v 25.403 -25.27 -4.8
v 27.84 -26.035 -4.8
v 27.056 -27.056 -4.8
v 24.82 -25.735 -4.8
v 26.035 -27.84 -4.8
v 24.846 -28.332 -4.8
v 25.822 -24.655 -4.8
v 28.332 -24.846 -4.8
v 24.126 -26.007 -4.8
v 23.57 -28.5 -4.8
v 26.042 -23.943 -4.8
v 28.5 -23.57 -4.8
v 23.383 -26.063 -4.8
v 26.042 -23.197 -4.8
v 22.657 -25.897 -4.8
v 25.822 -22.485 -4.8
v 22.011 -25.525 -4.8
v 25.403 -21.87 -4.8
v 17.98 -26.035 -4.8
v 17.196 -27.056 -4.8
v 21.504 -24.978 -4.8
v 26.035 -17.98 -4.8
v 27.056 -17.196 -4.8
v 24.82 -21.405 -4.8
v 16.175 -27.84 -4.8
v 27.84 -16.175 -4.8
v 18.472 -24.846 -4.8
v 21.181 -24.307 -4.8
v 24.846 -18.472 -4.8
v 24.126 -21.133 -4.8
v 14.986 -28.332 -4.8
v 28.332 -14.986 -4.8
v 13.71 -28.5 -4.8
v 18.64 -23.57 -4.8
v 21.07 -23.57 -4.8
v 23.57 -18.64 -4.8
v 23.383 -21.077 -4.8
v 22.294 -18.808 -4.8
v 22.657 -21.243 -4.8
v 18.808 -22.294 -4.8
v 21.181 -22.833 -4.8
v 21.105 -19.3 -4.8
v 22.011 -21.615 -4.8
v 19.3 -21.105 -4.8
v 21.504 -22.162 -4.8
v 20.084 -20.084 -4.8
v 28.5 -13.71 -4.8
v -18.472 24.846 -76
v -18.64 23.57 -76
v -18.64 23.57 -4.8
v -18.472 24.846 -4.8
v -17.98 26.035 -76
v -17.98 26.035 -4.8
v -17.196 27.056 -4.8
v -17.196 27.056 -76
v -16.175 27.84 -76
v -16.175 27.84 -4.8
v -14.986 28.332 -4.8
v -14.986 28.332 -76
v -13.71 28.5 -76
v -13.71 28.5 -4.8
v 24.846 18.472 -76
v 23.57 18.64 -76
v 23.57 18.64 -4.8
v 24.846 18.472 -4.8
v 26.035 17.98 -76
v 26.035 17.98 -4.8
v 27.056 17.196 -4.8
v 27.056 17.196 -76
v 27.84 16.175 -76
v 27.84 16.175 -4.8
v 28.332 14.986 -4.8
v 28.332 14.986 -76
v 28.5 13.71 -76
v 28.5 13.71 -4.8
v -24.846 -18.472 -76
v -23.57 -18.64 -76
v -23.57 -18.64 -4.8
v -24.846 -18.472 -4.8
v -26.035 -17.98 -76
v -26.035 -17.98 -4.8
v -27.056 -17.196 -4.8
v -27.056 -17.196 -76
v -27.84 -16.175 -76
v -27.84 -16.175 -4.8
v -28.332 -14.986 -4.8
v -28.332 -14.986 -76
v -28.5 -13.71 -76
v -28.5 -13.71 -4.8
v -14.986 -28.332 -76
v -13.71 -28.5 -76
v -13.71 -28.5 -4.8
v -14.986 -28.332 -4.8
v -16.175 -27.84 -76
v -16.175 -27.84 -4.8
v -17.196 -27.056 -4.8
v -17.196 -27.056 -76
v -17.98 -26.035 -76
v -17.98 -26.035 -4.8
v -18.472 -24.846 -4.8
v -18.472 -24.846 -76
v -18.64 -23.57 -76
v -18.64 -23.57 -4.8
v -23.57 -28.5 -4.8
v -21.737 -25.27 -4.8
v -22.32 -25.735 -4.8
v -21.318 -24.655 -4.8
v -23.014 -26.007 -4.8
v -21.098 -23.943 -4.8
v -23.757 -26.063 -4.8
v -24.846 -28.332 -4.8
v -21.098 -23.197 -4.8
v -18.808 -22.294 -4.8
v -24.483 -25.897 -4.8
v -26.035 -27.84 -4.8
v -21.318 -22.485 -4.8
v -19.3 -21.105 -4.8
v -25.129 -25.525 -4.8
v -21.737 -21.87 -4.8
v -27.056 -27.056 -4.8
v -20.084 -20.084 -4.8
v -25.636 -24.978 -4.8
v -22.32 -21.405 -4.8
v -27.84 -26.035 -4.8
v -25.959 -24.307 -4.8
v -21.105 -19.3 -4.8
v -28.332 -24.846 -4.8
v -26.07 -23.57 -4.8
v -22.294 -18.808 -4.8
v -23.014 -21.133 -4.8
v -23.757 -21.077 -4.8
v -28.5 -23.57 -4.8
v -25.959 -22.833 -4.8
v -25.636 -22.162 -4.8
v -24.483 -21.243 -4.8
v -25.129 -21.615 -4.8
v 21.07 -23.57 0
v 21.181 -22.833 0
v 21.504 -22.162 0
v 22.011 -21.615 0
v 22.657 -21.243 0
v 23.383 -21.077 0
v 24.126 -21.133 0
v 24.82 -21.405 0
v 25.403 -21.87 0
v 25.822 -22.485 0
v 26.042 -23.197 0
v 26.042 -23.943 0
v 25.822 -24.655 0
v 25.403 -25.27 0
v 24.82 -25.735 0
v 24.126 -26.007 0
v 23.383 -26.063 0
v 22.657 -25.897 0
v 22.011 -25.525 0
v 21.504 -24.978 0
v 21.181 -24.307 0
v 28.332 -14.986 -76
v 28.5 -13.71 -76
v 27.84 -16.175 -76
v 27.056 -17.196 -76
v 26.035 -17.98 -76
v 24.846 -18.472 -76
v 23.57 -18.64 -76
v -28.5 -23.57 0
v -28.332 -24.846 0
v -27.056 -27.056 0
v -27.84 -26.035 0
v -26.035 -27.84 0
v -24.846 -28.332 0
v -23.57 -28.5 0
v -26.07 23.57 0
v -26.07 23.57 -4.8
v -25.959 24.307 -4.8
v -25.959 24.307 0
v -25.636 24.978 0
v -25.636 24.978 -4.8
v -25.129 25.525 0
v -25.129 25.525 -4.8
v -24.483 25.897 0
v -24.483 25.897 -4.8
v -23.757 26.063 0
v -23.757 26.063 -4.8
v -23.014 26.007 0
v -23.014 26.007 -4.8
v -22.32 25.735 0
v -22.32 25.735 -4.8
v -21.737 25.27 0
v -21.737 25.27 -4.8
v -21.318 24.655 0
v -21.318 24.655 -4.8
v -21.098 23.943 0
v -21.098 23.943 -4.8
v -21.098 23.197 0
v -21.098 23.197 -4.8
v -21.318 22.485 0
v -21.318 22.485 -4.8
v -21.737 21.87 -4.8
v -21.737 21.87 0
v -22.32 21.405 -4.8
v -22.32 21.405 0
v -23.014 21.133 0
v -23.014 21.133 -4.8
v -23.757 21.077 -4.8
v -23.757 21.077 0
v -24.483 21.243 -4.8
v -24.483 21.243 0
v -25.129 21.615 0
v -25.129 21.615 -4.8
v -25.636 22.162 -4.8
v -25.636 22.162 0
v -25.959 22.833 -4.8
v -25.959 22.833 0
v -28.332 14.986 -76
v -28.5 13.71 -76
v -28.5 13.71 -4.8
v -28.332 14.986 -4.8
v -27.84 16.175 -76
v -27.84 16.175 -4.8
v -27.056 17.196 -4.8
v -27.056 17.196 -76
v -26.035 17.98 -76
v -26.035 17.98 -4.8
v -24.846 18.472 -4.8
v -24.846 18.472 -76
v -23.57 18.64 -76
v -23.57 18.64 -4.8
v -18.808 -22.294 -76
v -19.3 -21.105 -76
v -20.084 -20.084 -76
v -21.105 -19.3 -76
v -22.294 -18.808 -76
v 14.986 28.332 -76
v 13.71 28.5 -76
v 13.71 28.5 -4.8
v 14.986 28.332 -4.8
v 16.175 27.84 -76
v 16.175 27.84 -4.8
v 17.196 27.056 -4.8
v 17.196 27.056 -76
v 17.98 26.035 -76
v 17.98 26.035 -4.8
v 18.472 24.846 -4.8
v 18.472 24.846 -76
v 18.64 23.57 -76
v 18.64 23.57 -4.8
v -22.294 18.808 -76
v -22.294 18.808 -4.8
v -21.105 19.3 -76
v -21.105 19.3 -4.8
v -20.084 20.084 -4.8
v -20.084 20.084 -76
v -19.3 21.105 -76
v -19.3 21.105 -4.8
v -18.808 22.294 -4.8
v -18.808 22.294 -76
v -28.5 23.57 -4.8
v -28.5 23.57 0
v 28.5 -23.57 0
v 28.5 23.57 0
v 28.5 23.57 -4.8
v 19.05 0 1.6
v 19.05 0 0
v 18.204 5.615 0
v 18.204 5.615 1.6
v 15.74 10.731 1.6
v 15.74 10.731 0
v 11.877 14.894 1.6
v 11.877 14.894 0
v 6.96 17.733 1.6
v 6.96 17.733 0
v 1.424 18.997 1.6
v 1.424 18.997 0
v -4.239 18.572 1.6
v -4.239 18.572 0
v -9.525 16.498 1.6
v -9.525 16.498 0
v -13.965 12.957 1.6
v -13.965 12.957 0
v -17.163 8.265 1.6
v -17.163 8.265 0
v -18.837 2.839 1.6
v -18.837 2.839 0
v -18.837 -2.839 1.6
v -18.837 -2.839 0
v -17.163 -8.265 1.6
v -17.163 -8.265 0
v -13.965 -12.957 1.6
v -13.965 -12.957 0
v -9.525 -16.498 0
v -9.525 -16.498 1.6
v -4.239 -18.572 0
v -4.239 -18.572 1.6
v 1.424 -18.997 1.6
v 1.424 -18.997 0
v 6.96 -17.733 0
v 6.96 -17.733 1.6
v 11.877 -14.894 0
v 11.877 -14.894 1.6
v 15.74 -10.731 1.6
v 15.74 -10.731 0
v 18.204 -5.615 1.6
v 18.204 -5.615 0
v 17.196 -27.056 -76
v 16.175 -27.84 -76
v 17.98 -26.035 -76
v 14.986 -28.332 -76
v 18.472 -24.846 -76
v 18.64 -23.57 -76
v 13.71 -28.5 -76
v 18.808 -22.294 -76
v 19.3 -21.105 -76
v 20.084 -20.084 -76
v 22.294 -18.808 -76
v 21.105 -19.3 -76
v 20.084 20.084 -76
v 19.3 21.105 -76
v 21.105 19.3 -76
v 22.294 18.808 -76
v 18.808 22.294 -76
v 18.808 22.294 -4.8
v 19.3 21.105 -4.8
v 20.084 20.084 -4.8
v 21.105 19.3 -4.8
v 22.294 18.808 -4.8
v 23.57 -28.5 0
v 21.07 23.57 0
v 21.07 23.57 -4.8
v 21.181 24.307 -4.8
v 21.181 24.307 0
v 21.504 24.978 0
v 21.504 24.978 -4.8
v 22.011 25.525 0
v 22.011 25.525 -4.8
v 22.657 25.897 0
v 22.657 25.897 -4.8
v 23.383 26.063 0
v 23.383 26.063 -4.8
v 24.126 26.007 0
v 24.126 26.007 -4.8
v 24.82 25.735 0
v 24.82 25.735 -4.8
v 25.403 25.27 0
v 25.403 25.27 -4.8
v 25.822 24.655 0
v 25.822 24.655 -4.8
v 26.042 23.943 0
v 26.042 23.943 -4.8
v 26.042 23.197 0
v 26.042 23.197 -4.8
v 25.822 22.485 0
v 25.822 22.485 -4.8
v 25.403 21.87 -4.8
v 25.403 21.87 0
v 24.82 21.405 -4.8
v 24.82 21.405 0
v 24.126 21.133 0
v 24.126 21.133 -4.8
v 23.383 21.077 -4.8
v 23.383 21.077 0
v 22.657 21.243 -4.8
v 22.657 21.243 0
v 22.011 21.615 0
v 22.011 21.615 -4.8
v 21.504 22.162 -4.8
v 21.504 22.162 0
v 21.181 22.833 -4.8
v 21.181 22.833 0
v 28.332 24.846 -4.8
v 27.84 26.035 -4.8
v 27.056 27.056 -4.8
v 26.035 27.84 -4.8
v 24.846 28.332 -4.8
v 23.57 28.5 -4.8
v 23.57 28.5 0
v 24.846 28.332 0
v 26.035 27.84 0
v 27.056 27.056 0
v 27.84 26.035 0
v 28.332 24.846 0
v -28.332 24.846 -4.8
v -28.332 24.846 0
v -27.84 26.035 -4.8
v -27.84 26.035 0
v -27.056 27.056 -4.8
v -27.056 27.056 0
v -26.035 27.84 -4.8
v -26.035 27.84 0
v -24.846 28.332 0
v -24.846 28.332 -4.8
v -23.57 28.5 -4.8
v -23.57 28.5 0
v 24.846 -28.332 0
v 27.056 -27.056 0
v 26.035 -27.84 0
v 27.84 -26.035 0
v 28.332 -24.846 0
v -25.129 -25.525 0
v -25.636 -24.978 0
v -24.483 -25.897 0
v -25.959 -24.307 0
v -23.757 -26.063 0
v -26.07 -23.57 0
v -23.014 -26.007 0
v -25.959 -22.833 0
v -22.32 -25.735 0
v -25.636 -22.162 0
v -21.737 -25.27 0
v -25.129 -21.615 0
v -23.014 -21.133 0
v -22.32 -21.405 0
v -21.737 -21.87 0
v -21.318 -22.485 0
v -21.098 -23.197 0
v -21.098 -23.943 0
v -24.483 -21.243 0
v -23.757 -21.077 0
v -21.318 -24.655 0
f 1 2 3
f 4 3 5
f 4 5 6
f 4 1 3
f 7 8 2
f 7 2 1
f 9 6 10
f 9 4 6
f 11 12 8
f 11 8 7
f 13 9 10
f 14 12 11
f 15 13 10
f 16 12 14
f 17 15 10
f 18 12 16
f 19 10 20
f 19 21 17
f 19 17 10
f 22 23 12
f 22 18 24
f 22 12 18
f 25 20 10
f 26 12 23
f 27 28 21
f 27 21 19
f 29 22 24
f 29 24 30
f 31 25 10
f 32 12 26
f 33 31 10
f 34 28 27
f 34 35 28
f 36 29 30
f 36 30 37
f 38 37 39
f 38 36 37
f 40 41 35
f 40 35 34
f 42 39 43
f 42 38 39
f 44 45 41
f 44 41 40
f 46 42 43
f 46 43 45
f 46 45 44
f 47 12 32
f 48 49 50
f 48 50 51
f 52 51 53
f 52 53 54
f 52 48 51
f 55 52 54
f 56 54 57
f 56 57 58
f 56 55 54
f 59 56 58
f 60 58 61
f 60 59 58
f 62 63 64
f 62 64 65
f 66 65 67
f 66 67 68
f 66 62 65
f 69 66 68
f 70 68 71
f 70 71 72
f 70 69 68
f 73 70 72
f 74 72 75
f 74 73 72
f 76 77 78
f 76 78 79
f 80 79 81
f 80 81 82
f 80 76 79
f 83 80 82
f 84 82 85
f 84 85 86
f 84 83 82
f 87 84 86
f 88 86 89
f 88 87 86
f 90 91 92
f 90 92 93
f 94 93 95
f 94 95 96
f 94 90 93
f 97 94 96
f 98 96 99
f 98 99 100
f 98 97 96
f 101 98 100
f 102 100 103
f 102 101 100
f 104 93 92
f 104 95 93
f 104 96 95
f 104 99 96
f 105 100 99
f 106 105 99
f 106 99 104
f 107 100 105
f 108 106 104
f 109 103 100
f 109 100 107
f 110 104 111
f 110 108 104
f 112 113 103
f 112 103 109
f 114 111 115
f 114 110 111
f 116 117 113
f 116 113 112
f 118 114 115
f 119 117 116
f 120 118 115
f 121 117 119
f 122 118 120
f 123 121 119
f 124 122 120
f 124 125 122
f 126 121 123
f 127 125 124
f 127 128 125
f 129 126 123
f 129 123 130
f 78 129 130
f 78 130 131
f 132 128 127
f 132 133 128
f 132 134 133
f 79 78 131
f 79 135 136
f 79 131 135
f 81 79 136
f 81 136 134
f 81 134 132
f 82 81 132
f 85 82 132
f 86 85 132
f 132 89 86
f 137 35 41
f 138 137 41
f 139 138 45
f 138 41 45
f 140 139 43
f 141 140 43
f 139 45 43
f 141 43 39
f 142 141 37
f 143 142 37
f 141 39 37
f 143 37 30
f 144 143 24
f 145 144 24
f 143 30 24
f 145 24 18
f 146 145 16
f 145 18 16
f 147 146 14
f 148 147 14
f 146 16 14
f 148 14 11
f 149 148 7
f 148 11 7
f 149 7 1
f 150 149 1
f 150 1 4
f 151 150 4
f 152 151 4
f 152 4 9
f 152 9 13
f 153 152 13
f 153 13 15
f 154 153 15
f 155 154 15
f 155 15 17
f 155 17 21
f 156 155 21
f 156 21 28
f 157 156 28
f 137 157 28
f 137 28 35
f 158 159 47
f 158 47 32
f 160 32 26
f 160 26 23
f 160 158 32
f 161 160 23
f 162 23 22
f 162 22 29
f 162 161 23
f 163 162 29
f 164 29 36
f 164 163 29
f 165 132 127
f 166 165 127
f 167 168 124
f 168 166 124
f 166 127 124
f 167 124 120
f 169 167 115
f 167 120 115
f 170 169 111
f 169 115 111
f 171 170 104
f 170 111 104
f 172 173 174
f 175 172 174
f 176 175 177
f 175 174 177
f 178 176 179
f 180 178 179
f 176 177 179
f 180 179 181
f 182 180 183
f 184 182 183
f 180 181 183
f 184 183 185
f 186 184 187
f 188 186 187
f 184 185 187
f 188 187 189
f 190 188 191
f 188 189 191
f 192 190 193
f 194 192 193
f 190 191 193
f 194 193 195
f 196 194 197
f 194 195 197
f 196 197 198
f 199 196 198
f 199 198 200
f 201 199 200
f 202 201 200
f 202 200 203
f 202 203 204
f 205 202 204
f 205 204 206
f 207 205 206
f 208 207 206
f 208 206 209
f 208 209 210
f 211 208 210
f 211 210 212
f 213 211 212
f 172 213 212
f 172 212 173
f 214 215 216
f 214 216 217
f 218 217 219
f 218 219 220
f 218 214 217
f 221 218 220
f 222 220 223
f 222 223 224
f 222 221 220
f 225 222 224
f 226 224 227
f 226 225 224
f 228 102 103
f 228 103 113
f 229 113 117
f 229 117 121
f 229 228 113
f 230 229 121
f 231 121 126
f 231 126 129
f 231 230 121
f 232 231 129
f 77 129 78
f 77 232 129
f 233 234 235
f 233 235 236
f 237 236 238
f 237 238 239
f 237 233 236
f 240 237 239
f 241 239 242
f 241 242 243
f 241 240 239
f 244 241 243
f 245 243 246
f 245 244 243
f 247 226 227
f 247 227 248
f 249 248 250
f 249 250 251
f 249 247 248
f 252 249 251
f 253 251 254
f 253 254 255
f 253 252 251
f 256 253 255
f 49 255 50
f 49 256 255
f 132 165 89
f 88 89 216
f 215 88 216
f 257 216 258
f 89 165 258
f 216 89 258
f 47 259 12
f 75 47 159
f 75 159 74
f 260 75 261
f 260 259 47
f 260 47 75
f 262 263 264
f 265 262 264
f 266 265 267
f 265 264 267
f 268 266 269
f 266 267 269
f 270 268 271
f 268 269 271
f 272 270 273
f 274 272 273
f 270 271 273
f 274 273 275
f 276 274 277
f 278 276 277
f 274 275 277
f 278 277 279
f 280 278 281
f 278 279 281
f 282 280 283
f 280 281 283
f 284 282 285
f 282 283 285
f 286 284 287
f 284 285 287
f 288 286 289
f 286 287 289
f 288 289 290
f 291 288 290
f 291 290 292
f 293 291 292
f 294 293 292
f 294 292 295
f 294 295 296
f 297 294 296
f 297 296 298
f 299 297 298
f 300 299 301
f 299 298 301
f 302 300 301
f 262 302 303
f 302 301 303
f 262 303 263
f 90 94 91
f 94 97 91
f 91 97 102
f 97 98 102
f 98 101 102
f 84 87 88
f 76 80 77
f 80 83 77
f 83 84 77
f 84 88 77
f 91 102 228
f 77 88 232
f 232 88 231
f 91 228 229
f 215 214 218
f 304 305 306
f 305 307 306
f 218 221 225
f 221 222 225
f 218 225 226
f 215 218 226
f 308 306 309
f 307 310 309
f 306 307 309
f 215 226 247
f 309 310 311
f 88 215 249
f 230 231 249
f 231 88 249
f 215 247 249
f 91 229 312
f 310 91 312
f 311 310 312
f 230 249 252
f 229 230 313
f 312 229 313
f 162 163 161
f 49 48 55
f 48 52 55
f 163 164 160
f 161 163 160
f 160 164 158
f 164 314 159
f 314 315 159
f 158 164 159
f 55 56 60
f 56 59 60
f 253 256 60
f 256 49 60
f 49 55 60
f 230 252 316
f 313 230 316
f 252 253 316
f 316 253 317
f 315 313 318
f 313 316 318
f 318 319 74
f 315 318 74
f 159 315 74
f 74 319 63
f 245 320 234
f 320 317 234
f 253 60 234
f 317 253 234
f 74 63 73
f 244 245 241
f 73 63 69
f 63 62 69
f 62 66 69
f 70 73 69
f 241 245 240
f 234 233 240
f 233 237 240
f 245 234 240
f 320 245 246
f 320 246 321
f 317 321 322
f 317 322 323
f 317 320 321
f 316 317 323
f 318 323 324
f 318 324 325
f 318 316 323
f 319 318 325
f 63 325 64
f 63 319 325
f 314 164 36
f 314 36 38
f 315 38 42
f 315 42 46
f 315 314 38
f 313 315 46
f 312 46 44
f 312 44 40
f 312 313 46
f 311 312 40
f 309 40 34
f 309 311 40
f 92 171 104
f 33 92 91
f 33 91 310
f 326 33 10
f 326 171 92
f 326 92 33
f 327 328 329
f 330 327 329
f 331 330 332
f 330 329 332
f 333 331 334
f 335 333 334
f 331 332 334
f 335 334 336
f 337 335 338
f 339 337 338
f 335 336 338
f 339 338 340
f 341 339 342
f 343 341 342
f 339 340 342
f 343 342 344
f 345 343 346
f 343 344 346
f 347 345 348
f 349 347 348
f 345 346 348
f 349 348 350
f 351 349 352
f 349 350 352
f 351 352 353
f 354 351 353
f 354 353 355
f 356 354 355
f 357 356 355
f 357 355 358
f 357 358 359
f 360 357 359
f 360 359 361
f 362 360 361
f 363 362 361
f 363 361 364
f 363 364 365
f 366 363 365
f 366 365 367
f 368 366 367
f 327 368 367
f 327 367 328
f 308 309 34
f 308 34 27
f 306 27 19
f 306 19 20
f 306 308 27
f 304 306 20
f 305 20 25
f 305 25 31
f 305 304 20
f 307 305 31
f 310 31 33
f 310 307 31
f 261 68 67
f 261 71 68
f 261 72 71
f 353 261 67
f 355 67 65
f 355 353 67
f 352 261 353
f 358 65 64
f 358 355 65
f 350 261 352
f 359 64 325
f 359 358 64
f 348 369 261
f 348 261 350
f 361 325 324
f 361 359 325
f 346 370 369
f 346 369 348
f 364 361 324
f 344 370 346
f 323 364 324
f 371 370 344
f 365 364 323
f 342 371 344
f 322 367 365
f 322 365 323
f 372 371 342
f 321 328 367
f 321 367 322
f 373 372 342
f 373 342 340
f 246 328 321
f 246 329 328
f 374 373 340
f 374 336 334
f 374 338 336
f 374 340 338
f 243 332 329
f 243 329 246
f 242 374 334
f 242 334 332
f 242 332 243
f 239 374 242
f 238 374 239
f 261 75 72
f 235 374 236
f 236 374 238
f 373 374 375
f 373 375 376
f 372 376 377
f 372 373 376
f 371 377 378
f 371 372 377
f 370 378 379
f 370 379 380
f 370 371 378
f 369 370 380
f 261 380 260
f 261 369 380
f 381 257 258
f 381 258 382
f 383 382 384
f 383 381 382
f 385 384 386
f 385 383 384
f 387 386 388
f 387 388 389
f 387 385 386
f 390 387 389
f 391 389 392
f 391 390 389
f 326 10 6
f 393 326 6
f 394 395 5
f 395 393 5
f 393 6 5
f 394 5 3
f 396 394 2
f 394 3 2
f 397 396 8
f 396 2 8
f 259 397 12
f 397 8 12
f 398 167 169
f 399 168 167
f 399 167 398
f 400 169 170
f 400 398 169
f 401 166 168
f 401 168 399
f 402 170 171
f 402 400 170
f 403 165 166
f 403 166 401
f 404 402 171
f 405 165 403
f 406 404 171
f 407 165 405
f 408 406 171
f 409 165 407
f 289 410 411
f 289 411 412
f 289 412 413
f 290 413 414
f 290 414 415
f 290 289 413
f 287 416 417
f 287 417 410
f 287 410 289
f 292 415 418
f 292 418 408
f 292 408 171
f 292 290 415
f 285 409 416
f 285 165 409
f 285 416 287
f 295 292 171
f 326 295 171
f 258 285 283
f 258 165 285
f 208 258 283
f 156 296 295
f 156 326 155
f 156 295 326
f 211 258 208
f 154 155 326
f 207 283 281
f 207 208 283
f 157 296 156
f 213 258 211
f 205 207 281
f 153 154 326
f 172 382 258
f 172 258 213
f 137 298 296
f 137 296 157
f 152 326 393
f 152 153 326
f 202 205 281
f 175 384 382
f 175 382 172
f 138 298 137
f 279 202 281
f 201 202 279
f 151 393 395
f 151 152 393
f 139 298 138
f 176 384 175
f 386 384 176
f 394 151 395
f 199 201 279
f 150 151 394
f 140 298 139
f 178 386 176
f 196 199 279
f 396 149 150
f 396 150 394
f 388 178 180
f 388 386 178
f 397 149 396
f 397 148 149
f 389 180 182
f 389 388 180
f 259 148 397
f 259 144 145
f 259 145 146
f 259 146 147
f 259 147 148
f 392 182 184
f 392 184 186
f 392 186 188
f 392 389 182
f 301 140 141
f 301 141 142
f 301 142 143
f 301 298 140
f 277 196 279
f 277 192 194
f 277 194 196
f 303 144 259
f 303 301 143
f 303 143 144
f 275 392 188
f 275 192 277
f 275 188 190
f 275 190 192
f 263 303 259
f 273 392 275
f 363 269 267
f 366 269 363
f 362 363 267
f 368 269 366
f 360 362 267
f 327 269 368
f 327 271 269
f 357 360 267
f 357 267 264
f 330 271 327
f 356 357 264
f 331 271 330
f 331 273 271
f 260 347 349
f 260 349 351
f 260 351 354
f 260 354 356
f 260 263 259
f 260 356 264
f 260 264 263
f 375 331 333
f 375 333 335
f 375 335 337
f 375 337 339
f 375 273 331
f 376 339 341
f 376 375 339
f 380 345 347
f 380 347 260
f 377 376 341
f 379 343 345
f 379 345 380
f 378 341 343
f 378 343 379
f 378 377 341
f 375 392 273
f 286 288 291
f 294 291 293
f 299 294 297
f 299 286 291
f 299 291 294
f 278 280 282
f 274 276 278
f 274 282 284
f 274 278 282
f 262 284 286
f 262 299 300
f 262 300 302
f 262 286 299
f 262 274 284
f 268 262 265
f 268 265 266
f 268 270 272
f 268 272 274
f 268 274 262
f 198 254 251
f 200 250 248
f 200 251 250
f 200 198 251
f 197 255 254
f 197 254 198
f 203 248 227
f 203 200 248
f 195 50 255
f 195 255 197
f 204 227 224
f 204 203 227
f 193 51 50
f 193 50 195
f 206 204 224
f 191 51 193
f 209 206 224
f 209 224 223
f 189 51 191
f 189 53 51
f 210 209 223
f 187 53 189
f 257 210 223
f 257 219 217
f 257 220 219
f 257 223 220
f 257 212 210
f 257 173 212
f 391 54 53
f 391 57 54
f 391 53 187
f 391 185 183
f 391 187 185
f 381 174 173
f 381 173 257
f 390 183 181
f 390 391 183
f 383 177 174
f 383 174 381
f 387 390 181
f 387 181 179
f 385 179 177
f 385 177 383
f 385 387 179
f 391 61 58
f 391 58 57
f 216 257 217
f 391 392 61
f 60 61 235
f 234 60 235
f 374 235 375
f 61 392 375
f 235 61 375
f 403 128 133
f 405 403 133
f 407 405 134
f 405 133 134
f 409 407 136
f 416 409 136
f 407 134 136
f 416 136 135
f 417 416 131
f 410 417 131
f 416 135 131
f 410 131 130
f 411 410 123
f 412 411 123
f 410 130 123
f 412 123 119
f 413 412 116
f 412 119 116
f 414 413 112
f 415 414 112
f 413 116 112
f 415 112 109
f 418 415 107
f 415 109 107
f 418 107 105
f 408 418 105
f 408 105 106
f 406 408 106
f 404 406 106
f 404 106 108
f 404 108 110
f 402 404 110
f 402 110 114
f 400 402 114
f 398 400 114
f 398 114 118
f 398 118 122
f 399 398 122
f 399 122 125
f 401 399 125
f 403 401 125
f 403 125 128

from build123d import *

# Parameters (mm, degrees)
SKETCH1_W           = 57
SKETCH1_H           = 57
BOSS_EXTRUDE1_DEPTH = 76
SKETCH3_R           = 2.5
CUT_EXTRUDE1_DEPTH  = 77
CUT_EXTRUDE2_DEPTH  = 77
SKETCH5_OUTSIDE_W   = 81.158
SKETCH5_OUTSIDE_H   = 81.158
CUT_EXTRUDE3_DEPTH  = 71.2
SKETCH6_R           = 19.05
BOSS_EXTRUDE2_DEPTH = 1.6


with BuildPart() as part:
    # Sketch1 → Boss-Extrude1 (new body)
    with BuildSketch(Plane.XY):
        Rectangle(SKETCH1_W, SKETCH1_H)
    extrude(amount=-BOSS_EXTRUDE1_DEPTH)

    # Sketch3 → Cut-Extrude1 (cut, through all)
    with BuildSketch(Plane(origin=(0, 0, -76), x_dir=(-1, 0, 0), z_dir=(0, 0, -1))):
        with Locations((-23.57, 23.57)):
            Circle(SKETCH3_R)
        with Locations((-23.57, -23.57)):
            Circle(SKETCH3_R)
        with Locations((23.57, 23.57)):
            Circle(SKETCH3_R)
        with Locations((23.57, -23.57)):
            Circle(SKETCH3_R)
    extrude(amount=-CUT_EXTRUDE1_DEPTH, mode=Mode.SUBTRACT)

    # Sketch4 → Cut-Extrude2 (cut, through all)
    with BuildSketch(Plane(origin=(0, 0, -76), x_dir=(-1, 0, 0), z_dir=(0, 0, -1))):
        with BuildLine():
            Line((-28.5, 23.57), (-28.5, 28.5))
            Line((-28.5, 28.5), (-23.57, 28.5))
            ThreePointArc((-23.57, 28.5), (-27.056036431, 27.056036431), (-28.5, 23.57))
        make_face()
        with BuildLine():
            Line((23.57, 28.5), (28.5, 28.5))
            Line((28.5, 28.5), (28.5, 23.57))
            ThreePointArc((28.5, 23.57), (27.056036431, 27.056036431), (23.57, 28.5))
        make_face()
        with BuildLine():
            Line((-28.5, -23.57), (-28.5, -28.5))
            Line((-28.5, -28.5), (-23.57, -28.5))
            ThreePointArc((-23.57, -28.5), (-27.056036431, -27.056036431), (-28.5, -23.57))
        make_face()
        with BuildLine():
            Line((23.57, -28.5), (28.5, -28.5))
            Line((28.5, -28.5), (28.5, -23.57))
            ThreePointArc((28.5, -23.57), (27.056036431, -27.056036431), (23.57, -28.5))
        make_face()
    extrude(amount=-CUT_EXTRUDE2_DEPTH, mode=Mode.SUBTRACT)

    # Sketch5 outside → Cut-Extrude3 (cut)
    with BuildSketch(Plane(origin=(0, 0, -76), x_dir=(-1, 0, 0), z_dir=(0, 0, -1))):
        Rectangle(SKETCH5_OUTSIDE_W, SKETCH5_OUTSIDE_H)
        with BuildLine():
            Line((-28.5, 13.71), (-28.5, -13.71))
            ThreePointArc((-28.5, -13.71), (-27.056036431, -17.196036431), (-23.57, -18.64))
            ThreePointArc((-23.57, -18.64), (-20.083963569, -20.083963569), (-18.64, -23.57))
            ThreePointArc((-18.64, -23.57), (-17.196036431, -27.056036431), (-13.71, -28.5))
            Line((-13.71, -28.5), (13.71, -28.5))
            ThreePointArc((13.71, -28.5), (17.196036431, -27.056036431), (18.64, -23.57))
            ThreePointArc((18.64, -23.57), (20.083963569, -20.083963569), (23.57, -18.64))
            ThreePointArc((23.57, -18.64), (27.056036431, -17.196036431), (28.5, -13.71))
            Line((28.5, -13.71), (28.5, 13.71))
            ThreePointArc((28.5, 13.71), (27.056036431, 17.196036431), (23.57, 18.64))
            ThreePointArc((23.57, 18.64), (20.083963569, 20.083963569), (18.64, 23.57))
            ThreePointArc((18.64, 23.57), (17.196036431, 27.056036431), (13.71, 28.5))
            Line((13.71, 28.5), (-13.71, 28.5))
            ThreePointArc((-13.71, 28.5), (-17.196036431, 27.056036431), (-18.64, 23.57))
            ThreePointArc((-18.64, 23.57), (-20.083963569, 20.083963569), (-23.57, 18.64))
            ThreePointArc((-23.57, 18.64), (-27.056036431, 17.196036431), (-28.5, 13.71))
        make_face(mode=Mode.SUBTRACT)
    extrude(amount=-CUT_EXTRUDE3_DEPTH, mode=Mode.SUBTRACT)

    # Sketch6 → Boss-Extrude2 (add)
    with BuildSketch(Plane.XY):
        Circle(SKETCH6_R)
    extrude(amount=BOSS_EXTRUDE2_DEPTH)


solid = part.part
